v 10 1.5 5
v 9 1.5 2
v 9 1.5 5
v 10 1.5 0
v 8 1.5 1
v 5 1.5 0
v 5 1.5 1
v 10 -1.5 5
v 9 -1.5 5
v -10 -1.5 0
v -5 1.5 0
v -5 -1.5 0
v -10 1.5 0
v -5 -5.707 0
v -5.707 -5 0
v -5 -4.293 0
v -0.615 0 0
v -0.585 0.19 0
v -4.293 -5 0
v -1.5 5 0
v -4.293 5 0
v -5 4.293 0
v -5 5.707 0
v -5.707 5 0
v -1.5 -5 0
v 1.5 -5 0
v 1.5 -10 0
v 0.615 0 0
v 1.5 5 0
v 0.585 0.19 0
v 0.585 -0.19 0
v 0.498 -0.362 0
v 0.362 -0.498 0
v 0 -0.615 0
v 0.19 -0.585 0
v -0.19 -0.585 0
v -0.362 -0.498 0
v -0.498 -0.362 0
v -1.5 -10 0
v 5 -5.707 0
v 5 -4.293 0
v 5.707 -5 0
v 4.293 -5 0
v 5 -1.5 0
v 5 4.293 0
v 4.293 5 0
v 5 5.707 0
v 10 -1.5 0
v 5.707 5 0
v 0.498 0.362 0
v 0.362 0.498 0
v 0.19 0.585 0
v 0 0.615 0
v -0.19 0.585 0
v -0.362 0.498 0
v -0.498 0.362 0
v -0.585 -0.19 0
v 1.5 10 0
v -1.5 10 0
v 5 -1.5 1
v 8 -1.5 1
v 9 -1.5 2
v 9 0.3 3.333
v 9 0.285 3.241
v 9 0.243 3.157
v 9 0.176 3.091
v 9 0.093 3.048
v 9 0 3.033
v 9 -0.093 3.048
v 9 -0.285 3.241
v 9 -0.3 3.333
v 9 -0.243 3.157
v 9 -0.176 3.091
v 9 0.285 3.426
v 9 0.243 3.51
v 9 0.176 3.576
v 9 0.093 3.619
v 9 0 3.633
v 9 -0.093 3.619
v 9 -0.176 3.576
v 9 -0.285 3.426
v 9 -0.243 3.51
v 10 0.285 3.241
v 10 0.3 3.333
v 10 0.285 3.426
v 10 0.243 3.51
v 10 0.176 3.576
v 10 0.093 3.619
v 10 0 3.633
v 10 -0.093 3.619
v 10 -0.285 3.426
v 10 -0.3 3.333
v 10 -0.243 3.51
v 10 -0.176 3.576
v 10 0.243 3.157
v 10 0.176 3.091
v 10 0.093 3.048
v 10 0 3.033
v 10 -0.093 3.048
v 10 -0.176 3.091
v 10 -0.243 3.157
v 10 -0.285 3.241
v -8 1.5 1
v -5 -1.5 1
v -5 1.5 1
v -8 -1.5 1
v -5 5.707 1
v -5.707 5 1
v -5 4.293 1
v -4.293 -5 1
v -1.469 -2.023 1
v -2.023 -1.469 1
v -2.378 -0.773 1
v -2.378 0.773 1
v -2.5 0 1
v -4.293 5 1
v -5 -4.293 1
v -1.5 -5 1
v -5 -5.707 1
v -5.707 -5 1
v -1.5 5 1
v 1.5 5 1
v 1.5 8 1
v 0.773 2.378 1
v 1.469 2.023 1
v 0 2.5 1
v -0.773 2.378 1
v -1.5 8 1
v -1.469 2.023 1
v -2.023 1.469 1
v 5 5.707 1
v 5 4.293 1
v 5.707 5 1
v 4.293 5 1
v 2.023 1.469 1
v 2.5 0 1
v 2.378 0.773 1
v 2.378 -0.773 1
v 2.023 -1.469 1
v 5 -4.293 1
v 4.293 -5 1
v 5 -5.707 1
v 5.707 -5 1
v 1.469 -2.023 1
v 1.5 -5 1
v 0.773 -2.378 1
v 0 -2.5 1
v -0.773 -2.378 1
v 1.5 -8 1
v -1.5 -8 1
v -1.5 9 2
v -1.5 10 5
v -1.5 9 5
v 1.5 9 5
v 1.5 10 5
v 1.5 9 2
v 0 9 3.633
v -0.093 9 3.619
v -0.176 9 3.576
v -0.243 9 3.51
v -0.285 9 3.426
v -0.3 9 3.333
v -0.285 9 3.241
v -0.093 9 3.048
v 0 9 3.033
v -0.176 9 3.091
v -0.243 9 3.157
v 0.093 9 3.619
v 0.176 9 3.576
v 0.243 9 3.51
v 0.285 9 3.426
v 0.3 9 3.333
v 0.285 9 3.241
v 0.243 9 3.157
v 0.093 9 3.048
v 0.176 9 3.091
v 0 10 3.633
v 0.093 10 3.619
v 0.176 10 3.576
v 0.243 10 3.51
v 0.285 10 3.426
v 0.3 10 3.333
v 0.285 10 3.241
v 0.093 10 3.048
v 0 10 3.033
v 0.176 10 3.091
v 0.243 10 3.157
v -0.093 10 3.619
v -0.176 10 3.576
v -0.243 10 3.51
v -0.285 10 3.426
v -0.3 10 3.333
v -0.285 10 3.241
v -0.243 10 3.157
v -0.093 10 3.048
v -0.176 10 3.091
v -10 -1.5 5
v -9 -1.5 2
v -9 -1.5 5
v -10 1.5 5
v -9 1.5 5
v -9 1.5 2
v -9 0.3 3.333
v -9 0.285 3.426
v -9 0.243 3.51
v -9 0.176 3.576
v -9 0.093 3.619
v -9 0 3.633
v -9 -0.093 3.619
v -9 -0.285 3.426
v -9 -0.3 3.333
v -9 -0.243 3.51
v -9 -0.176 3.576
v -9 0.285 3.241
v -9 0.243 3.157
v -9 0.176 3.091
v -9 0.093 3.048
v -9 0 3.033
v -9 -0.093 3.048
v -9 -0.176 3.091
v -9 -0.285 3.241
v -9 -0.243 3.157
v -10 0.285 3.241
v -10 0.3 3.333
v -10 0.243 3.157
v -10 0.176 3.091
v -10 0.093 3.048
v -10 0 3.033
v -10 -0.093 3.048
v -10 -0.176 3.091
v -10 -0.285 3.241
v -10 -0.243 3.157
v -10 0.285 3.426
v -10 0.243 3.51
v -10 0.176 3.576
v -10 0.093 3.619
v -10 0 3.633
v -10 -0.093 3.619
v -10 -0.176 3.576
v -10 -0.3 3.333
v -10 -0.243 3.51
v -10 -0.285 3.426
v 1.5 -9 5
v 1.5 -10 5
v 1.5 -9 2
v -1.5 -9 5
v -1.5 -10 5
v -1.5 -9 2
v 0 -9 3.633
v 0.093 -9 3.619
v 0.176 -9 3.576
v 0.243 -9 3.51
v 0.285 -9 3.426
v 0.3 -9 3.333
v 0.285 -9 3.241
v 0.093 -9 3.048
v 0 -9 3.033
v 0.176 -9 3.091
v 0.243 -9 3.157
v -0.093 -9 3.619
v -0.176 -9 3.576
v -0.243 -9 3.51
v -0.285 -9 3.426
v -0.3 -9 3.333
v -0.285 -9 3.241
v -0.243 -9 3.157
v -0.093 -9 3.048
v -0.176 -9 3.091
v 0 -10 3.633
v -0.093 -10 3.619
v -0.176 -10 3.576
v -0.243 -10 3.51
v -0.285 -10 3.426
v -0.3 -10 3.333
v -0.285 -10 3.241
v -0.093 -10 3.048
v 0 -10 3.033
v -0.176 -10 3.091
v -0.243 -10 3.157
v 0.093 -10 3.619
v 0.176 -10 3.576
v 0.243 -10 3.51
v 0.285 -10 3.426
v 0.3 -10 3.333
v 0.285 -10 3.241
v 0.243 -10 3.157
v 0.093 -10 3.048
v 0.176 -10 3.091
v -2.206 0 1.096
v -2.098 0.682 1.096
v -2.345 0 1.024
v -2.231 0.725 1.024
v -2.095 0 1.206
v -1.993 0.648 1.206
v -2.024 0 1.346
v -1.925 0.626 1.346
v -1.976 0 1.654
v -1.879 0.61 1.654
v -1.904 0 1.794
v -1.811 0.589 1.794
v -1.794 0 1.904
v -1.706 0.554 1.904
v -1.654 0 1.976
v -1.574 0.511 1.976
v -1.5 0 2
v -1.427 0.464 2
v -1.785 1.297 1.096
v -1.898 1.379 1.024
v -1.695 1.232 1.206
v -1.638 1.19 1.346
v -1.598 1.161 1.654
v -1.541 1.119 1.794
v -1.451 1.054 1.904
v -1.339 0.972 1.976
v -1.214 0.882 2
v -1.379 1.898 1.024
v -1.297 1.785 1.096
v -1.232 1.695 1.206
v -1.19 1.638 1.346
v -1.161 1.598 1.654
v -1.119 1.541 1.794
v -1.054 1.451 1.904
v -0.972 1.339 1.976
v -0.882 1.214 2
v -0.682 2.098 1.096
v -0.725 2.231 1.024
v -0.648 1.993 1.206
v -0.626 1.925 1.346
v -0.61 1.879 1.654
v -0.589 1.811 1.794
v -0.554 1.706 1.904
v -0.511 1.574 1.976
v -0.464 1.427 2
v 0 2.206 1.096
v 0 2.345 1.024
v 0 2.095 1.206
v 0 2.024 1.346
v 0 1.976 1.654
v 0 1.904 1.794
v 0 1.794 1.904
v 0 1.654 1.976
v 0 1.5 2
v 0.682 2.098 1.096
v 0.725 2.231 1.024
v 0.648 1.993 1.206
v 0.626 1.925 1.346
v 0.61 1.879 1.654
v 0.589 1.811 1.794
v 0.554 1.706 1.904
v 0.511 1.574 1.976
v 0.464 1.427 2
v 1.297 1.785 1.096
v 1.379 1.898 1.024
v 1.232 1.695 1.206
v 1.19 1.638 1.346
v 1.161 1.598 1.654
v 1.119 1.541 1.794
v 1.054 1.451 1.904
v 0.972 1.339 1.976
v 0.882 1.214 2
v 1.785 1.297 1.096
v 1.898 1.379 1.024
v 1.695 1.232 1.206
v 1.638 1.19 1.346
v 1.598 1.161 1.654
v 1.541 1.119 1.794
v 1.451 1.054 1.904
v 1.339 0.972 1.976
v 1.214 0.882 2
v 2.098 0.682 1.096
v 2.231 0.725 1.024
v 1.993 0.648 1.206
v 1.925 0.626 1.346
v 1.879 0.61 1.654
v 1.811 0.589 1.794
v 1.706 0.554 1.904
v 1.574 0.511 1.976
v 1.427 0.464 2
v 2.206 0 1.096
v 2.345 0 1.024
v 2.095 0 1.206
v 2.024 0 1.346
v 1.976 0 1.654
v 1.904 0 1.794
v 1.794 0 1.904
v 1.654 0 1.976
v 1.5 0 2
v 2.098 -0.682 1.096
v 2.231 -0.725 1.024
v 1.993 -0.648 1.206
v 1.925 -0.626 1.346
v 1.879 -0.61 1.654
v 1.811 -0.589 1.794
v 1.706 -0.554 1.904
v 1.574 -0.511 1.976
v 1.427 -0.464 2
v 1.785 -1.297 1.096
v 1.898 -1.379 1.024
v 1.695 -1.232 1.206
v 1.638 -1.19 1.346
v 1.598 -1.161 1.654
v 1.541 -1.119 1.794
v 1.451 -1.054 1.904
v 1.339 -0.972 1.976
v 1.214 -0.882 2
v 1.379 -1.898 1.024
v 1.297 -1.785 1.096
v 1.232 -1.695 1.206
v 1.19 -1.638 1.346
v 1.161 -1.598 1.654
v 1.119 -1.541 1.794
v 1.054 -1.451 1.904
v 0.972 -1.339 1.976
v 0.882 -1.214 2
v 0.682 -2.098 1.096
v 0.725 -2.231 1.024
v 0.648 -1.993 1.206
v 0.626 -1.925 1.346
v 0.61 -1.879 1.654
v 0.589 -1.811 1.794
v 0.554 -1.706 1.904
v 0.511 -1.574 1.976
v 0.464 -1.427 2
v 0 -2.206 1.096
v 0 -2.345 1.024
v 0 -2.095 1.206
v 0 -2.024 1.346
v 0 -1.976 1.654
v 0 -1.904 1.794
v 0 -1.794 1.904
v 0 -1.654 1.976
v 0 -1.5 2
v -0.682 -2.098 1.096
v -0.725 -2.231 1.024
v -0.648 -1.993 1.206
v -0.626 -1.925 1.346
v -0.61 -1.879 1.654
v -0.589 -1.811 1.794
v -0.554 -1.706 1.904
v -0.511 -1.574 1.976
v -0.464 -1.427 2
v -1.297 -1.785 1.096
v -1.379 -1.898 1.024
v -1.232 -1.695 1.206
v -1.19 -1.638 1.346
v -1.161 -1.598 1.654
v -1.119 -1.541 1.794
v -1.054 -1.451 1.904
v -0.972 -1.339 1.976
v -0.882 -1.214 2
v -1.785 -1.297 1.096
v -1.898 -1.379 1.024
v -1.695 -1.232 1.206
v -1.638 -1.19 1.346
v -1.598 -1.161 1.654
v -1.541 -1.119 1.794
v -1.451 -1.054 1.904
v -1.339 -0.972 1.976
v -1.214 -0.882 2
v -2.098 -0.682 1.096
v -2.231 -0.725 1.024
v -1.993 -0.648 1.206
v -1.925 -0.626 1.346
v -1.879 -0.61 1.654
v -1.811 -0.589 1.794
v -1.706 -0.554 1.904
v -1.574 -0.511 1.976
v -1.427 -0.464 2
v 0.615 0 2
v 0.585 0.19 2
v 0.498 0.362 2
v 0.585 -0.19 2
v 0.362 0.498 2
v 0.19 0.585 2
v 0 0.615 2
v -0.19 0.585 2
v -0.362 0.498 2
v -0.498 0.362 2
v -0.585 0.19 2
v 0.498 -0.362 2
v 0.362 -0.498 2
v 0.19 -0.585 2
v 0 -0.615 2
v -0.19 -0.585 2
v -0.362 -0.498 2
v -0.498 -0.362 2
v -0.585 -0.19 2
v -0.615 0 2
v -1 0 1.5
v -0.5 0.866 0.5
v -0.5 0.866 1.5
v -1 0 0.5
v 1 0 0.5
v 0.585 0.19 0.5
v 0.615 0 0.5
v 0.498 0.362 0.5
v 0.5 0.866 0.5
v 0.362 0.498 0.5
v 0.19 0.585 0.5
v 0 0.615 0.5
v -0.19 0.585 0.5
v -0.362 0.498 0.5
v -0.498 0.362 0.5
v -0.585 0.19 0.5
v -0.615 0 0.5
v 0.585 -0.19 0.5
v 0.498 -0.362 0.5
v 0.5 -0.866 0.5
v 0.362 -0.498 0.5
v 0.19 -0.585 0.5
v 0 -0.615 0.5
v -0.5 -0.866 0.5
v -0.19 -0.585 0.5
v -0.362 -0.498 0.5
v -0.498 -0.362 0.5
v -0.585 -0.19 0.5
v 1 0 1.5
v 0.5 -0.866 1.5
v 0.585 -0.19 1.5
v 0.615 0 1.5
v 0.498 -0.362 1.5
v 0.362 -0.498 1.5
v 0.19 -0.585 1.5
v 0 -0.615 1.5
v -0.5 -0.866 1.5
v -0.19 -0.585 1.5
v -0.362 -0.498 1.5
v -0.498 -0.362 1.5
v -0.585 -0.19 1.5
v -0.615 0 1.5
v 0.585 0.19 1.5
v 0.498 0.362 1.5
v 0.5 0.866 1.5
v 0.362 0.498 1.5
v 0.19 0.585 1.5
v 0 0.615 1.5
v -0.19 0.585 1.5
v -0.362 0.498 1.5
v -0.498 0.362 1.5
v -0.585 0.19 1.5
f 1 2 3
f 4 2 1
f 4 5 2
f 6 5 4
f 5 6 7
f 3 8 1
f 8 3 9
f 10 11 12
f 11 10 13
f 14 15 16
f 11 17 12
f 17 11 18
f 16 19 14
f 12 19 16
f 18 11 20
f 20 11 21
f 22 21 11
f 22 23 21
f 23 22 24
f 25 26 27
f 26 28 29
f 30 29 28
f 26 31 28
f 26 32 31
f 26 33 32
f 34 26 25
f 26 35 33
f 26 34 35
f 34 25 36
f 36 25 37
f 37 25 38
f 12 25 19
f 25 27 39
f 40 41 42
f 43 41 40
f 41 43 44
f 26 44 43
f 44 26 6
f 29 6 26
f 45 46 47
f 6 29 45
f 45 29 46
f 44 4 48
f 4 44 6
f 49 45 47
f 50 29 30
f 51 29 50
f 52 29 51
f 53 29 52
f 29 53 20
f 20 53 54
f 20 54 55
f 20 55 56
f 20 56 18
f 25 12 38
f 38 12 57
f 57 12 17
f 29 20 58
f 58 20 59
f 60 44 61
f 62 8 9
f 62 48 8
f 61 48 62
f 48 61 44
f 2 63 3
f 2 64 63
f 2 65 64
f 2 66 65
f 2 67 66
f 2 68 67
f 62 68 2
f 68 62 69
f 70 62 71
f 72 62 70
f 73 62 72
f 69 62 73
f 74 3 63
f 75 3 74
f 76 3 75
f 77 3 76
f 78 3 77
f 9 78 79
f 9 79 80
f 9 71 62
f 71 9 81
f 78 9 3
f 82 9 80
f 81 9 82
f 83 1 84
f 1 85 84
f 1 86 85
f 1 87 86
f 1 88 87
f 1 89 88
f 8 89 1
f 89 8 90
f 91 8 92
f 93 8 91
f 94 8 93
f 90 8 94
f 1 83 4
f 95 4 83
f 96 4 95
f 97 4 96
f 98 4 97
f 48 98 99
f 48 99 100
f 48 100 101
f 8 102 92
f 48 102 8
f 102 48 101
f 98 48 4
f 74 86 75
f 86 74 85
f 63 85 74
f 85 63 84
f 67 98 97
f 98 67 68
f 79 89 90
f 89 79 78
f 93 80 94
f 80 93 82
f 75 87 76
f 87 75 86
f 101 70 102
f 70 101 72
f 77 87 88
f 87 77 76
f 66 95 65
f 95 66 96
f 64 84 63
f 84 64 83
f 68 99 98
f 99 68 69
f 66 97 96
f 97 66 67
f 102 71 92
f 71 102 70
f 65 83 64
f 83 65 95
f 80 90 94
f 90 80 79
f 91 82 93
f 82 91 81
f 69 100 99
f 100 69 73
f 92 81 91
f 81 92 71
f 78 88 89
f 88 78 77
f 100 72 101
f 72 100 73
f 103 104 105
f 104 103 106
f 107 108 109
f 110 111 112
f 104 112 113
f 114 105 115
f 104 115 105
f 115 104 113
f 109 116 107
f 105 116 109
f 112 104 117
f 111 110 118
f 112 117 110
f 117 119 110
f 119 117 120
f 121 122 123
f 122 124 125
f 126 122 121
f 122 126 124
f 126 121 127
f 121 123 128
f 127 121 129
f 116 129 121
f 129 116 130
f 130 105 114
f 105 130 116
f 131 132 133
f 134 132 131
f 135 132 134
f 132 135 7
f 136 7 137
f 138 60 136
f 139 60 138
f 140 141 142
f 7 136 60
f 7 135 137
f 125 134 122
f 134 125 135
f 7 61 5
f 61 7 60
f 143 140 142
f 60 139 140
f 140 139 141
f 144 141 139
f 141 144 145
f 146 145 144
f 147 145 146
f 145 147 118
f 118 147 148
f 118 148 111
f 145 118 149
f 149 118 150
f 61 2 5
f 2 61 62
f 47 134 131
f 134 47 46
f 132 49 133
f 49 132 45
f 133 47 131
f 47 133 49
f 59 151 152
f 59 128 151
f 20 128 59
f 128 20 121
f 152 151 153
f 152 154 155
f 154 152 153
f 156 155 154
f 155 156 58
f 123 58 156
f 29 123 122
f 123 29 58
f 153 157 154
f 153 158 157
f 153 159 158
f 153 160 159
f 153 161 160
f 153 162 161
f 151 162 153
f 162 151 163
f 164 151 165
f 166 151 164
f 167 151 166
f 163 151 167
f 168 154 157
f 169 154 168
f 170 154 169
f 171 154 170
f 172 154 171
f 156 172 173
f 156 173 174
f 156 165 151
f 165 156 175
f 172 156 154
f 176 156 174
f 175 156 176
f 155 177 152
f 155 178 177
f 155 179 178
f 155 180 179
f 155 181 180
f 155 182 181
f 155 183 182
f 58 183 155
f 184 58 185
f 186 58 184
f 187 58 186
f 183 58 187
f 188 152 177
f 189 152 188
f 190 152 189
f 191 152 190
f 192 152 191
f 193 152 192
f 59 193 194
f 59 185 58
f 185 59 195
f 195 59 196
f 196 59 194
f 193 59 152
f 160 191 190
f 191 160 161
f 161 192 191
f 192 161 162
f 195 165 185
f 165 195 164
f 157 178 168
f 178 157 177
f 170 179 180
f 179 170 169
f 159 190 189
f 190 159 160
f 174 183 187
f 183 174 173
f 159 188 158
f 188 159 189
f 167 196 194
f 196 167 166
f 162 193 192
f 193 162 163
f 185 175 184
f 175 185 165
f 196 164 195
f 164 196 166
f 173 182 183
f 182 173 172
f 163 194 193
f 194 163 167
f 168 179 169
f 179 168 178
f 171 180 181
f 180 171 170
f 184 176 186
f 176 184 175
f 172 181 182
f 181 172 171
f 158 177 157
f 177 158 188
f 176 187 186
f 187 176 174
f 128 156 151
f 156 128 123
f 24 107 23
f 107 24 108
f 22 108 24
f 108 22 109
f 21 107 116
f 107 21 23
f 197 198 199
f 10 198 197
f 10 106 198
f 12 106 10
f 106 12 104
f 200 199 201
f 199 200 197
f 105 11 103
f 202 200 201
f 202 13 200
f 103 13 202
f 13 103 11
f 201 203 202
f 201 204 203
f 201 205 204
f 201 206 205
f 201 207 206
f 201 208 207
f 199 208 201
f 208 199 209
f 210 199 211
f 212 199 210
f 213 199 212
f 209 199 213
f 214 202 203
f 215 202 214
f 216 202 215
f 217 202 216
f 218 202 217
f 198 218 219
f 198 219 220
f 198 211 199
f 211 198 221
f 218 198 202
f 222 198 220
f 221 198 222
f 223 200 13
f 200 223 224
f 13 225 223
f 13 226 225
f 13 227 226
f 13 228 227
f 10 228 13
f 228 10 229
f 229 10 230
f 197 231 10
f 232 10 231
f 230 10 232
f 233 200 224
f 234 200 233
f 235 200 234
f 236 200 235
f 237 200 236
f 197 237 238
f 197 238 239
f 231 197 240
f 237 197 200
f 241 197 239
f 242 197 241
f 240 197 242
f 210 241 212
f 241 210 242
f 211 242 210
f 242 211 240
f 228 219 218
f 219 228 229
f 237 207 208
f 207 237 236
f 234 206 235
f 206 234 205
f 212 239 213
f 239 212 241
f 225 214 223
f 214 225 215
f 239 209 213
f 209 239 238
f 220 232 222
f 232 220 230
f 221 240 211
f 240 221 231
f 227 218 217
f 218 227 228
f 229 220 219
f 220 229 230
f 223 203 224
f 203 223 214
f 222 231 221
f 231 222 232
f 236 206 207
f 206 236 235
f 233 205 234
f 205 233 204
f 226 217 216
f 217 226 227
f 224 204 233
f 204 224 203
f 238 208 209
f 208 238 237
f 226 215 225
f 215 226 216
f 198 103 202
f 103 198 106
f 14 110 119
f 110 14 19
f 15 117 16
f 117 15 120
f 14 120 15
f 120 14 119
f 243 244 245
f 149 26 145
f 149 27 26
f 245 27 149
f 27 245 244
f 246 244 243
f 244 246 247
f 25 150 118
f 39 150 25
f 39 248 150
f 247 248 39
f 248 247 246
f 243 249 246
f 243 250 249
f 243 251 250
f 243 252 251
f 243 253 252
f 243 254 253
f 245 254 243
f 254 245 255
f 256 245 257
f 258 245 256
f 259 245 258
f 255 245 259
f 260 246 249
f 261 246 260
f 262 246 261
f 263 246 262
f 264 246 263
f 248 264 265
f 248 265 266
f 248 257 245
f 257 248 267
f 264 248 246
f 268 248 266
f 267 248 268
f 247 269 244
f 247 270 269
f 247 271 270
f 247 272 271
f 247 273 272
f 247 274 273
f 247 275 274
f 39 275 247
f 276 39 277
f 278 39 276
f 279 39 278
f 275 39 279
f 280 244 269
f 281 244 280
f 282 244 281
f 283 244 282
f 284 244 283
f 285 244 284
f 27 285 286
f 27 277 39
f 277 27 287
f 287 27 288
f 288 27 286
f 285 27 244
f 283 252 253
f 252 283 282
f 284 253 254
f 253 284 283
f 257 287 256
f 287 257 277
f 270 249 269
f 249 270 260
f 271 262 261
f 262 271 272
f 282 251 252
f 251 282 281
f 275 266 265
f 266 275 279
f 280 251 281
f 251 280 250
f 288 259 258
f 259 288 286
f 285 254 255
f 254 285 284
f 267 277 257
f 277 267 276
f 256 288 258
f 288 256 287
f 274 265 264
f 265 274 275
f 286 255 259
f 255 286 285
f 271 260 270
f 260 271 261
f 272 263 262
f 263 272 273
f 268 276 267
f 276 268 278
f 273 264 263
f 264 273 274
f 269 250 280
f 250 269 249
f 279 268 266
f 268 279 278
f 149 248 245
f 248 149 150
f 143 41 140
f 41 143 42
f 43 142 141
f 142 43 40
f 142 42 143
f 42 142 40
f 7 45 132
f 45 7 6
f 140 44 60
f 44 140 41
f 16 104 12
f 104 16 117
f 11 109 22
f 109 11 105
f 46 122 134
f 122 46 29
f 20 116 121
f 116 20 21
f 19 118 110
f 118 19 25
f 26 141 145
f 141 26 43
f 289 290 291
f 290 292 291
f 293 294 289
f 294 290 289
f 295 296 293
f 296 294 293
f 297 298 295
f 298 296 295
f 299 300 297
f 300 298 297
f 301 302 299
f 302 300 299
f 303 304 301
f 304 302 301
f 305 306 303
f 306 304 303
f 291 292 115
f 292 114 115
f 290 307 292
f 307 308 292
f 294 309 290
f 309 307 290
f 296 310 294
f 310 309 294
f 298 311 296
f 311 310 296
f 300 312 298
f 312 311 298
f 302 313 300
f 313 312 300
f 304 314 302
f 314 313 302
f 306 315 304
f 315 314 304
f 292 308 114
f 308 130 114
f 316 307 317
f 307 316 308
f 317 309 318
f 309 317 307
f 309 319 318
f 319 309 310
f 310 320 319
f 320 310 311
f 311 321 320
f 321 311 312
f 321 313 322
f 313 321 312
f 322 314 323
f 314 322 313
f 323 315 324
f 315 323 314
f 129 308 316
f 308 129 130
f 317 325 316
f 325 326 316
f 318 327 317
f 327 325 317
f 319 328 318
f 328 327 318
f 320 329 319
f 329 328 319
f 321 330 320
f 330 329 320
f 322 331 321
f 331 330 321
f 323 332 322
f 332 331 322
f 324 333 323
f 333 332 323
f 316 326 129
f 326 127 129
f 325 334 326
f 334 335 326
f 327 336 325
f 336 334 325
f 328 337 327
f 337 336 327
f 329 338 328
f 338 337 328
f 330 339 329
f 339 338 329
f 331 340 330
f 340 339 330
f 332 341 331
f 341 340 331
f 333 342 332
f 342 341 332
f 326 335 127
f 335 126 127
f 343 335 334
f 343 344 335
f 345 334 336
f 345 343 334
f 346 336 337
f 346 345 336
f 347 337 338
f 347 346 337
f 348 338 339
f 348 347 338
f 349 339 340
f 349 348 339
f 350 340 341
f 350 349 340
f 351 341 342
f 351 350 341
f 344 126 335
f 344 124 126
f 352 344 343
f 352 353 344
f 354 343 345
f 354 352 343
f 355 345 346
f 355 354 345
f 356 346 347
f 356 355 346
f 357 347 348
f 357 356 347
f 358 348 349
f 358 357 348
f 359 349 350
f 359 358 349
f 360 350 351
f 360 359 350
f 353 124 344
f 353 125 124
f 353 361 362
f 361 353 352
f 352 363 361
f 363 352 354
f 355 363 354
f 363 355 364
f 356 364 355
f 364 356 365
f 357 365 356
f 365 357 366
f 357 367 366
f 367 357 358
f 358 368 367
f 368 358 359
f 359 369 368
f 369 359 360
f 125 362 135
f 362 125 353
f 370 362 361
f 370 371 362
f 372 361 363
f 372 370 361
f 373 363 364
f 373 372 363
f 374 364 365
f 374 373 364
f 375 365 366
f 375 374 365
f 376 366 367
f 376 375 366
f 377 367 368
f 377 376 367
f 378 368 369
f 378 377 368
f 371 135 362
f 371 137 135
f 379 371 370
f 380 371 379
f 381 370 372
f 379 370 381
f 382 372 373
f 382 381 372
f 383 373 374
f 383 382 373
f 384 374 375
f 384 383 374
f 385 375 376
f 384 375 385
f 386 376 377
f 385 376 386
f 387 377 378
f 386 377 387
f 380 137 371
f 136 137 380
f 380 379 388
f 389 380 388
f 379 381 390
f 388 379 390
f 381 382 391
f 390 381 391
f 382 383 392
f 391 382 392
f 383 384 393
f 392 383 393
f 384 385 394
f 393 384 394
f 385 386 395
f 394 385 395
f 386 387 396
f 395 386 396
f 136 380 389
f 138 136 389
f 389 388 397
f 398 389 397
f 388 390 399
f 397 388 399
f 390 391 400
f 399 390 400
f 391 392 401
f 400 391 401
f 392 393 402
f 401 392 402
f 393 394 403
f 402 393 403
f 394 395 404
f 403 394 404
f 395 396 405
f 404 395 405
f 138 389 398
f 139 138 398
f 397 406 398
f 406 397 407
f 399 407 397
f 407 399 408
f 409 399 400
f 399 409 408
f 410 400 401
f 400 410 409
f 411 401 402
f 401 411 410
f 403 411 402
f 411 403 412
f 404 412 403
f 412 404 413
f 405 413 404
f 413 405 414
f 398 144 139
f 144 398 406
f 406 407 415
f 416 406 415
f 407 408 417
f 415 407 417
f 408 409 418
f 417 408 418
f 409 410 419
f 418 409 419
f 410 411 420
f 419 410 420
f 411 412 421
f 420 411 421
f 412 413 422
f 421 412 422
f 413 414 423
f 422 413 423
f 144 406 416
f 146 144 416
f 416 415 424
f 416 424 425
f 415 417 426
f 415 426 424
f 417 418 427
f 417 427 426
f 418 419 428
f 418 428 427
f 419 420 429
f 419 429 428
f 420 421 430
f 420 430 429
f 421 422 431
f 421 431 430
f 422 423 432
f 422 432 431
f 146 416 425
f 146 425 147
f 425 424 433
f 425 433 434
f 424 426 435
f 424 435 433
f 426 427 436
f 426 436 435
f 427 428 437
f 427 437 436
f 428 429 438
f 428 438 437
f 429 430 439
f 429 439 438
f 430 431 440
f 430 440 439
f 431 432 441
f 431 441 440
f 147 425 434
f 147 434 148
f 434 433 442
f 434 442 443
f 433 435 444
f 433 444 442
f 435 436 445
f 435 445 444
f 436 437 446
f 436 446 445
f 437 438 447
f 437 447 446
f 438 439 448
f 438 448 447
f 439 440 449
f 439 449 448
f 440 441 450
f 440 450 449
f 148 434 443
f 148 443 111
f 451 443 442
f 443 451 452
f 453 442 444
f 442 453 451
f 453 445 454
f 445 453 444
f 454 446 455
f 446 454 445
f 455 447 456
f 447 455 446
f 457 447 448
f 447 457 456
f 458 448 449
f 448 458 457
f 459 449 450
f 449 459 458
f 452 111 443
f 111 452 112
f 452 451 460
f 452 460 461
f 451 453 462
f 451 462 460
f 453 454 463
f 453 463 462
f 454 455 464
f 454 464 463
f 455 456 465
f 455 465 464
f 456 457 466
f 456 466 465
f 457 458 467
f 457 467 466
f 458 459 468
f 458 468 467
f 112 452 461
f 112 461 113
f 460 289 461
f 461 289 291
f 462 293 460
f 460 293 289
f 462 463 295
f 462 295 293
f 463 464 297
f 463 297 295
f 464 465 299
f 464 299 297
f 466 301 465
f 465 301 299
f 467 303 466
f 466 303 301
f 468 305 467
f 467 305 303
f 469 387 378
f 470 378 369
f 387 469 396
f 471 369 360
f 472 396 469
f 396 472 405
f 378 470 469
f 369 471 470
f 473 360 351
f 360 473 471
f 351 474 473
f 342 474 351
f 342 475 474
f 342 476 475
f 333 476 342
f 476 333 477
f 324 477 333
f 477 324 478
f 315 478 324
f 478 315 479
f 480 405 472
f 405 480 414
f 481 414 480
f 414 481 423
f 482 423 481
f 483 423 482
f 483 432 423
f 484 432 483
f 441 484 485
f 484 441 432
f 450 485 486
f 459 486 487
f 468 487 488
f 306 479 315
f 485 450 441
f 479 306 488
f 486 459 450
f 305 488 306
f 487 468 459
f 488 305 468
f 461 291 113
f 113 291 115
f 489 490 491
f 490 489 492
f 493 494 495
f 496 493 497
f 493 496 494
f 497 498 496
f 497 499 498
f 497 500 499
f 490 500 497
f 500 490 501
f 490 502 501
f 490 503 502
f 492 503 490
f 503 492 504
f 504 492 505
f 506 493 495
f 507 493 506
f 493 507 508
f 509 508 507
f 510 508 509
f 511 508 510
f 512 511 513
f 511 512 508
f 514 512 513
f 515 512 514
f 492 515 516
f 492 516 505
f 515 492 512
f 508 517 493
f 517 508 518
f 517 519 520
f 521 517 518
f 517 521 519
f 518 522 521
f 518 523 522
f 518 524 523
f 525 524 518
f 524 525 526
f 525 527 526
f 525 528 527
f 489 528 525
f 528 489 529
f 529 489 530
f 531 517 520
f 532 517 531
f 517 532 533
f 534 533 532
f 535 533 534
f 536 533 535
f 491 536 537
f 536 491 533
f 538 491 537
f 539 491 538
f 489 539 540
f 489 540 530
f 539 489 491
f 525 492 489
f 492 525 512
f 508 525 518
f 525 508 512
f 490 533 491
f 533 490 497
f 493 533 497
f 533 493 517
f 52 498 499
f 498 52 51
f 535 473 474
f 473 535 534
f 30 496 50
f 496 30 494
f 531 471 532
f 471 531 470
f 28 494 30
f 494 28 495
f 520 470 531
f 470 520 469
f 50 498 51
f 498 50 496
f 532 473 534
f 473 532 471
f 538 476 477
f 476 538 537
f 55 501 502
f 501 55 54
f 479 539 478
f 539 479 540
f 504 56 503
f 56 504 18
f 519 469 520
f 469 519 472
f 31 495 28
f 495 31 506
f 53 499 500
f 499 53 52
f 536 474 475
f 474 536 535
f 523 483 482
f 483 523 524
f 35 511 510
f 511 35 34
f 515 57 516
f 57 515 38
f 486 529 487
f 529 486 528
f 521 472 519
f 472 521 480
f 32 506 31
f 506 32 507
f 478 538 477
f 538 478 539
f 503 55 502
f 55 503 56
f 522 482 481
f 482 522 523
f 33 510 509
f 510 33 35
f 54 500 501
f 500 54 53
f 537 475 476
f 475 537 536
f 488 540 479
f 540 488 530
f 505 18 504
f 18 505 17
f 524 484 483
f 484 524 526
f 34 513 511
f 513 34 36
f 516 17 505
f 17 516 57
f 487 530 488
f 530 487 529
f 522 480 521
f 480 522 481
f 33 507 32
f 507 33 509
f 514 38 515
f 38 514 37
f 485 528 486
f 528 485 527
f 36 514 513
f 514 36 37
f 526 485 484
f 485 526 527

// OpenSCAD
epaisseur = 1;

difference() {
	union() {
		translate([-5, -5,0]) cube([10, 10, epaisseur]);
		for (i = [0 : 3]) {
			rotate(a = i * 90) {
				translate(v = [5, 5, 0]) {
					rotate(a = 45) {
						translate([-0.5, -0.5,0]) {
							cube([1, 1, epaisseur]);
						}
					}
				}
				translate(v = [15, 0, 0]) patteAccroche(3, 5, 5, epaisseur);
			}
		}
		translate([0, 0, epaisseur]) {
			renfort(2.5, 1);
		}
	}
	translate([0, 0, 1]) {
		ecrou(1);
	}
}

module ecrou(tailleEcrou) {
	union() {
		linear_extrude(height = 1, center = true, convexity = 10, twist = 0)
		polygon(points =	[ [tailleEcrou, 0], [tailleEcrou * cos(60) , tailleEcrou * sin(60)], 
						[tailleEcrou * cos(120) , tailleEcrou * sin(120)], 
						[tailleEcrou * cos(180) , tailleEcrou * sin(180)], 
						[tailleEcrou * cos(240) , tailleEcrou * sin(240)], 
						[tailleEcrou * cos(300) , tailleEcrou * sin(300)]]);
		translate(v = [0, 0, -10]) {		
			cylinder(h=20, r=tailleEcrou * (8 / 13),$fn=20);
		}
	}
}

module patteAccroche(largeur, longueur , hauteur, epaisseur) {
	translate([-longueur, - largeur / 2, 0]) rotate(a = 90) {
		union() {
			cube([largeur, longueur + 0.1, epaisseur]); // Le 0.1 sert à bien imbriquer le module
			difference() {
				cube(size = [largeur, epaisseur, hauteur]);
				translate ([largeur / 2, 0, 2 * hauteur / 3]) 
				rotate ([90,0,0]) cylinder (h = 4, r = 0.3, center = true, $fn = 20);
			}
			polyhedron(
				points =	[ [0,epaisseur,epaisseur], [0, 2 * epaisseur, epaisseur],
						[0, epaisseur, 2 * epaisseur], [largeur,epaisseur,epaisseur],
						[largeur, 2 * epaisseur, epaisseur], [largeur, epaisseur, 2 * epaisseur]  ],
				triangles = 	[ [0, 1, 2], [3, 5, 4], [0, 2, 3], [2, 5, 3], [1, 4, 5], [1, 5, 2] ,
						[1, 0, 4], [4, 0, 3] ]
			);
		}
	}
}

module renfort(diametre, epaisseur) {
	translate([0,0, epaisseur / 2]) {
		rotate_extrude(convexity = 10, $fn = 20) {
			difference() {
				union() {
					translate([(diametre - epaisseur) / 2, 0, 0]) square([diametre - epaisseur, epaisseur], true);
					translate([(diametre - epaisseur) , 0, 0]) circle(epaisseur / 2, $fn = 20);
					translate([(diametre - epaisseur), -epaisseur /2, 0]) square([epaisseur, epaisseur /2]);
				}
				translate([diametre, 0, 0]) circle(epaisseur / 2, $fn = 20);
			}
		}
	}
}
